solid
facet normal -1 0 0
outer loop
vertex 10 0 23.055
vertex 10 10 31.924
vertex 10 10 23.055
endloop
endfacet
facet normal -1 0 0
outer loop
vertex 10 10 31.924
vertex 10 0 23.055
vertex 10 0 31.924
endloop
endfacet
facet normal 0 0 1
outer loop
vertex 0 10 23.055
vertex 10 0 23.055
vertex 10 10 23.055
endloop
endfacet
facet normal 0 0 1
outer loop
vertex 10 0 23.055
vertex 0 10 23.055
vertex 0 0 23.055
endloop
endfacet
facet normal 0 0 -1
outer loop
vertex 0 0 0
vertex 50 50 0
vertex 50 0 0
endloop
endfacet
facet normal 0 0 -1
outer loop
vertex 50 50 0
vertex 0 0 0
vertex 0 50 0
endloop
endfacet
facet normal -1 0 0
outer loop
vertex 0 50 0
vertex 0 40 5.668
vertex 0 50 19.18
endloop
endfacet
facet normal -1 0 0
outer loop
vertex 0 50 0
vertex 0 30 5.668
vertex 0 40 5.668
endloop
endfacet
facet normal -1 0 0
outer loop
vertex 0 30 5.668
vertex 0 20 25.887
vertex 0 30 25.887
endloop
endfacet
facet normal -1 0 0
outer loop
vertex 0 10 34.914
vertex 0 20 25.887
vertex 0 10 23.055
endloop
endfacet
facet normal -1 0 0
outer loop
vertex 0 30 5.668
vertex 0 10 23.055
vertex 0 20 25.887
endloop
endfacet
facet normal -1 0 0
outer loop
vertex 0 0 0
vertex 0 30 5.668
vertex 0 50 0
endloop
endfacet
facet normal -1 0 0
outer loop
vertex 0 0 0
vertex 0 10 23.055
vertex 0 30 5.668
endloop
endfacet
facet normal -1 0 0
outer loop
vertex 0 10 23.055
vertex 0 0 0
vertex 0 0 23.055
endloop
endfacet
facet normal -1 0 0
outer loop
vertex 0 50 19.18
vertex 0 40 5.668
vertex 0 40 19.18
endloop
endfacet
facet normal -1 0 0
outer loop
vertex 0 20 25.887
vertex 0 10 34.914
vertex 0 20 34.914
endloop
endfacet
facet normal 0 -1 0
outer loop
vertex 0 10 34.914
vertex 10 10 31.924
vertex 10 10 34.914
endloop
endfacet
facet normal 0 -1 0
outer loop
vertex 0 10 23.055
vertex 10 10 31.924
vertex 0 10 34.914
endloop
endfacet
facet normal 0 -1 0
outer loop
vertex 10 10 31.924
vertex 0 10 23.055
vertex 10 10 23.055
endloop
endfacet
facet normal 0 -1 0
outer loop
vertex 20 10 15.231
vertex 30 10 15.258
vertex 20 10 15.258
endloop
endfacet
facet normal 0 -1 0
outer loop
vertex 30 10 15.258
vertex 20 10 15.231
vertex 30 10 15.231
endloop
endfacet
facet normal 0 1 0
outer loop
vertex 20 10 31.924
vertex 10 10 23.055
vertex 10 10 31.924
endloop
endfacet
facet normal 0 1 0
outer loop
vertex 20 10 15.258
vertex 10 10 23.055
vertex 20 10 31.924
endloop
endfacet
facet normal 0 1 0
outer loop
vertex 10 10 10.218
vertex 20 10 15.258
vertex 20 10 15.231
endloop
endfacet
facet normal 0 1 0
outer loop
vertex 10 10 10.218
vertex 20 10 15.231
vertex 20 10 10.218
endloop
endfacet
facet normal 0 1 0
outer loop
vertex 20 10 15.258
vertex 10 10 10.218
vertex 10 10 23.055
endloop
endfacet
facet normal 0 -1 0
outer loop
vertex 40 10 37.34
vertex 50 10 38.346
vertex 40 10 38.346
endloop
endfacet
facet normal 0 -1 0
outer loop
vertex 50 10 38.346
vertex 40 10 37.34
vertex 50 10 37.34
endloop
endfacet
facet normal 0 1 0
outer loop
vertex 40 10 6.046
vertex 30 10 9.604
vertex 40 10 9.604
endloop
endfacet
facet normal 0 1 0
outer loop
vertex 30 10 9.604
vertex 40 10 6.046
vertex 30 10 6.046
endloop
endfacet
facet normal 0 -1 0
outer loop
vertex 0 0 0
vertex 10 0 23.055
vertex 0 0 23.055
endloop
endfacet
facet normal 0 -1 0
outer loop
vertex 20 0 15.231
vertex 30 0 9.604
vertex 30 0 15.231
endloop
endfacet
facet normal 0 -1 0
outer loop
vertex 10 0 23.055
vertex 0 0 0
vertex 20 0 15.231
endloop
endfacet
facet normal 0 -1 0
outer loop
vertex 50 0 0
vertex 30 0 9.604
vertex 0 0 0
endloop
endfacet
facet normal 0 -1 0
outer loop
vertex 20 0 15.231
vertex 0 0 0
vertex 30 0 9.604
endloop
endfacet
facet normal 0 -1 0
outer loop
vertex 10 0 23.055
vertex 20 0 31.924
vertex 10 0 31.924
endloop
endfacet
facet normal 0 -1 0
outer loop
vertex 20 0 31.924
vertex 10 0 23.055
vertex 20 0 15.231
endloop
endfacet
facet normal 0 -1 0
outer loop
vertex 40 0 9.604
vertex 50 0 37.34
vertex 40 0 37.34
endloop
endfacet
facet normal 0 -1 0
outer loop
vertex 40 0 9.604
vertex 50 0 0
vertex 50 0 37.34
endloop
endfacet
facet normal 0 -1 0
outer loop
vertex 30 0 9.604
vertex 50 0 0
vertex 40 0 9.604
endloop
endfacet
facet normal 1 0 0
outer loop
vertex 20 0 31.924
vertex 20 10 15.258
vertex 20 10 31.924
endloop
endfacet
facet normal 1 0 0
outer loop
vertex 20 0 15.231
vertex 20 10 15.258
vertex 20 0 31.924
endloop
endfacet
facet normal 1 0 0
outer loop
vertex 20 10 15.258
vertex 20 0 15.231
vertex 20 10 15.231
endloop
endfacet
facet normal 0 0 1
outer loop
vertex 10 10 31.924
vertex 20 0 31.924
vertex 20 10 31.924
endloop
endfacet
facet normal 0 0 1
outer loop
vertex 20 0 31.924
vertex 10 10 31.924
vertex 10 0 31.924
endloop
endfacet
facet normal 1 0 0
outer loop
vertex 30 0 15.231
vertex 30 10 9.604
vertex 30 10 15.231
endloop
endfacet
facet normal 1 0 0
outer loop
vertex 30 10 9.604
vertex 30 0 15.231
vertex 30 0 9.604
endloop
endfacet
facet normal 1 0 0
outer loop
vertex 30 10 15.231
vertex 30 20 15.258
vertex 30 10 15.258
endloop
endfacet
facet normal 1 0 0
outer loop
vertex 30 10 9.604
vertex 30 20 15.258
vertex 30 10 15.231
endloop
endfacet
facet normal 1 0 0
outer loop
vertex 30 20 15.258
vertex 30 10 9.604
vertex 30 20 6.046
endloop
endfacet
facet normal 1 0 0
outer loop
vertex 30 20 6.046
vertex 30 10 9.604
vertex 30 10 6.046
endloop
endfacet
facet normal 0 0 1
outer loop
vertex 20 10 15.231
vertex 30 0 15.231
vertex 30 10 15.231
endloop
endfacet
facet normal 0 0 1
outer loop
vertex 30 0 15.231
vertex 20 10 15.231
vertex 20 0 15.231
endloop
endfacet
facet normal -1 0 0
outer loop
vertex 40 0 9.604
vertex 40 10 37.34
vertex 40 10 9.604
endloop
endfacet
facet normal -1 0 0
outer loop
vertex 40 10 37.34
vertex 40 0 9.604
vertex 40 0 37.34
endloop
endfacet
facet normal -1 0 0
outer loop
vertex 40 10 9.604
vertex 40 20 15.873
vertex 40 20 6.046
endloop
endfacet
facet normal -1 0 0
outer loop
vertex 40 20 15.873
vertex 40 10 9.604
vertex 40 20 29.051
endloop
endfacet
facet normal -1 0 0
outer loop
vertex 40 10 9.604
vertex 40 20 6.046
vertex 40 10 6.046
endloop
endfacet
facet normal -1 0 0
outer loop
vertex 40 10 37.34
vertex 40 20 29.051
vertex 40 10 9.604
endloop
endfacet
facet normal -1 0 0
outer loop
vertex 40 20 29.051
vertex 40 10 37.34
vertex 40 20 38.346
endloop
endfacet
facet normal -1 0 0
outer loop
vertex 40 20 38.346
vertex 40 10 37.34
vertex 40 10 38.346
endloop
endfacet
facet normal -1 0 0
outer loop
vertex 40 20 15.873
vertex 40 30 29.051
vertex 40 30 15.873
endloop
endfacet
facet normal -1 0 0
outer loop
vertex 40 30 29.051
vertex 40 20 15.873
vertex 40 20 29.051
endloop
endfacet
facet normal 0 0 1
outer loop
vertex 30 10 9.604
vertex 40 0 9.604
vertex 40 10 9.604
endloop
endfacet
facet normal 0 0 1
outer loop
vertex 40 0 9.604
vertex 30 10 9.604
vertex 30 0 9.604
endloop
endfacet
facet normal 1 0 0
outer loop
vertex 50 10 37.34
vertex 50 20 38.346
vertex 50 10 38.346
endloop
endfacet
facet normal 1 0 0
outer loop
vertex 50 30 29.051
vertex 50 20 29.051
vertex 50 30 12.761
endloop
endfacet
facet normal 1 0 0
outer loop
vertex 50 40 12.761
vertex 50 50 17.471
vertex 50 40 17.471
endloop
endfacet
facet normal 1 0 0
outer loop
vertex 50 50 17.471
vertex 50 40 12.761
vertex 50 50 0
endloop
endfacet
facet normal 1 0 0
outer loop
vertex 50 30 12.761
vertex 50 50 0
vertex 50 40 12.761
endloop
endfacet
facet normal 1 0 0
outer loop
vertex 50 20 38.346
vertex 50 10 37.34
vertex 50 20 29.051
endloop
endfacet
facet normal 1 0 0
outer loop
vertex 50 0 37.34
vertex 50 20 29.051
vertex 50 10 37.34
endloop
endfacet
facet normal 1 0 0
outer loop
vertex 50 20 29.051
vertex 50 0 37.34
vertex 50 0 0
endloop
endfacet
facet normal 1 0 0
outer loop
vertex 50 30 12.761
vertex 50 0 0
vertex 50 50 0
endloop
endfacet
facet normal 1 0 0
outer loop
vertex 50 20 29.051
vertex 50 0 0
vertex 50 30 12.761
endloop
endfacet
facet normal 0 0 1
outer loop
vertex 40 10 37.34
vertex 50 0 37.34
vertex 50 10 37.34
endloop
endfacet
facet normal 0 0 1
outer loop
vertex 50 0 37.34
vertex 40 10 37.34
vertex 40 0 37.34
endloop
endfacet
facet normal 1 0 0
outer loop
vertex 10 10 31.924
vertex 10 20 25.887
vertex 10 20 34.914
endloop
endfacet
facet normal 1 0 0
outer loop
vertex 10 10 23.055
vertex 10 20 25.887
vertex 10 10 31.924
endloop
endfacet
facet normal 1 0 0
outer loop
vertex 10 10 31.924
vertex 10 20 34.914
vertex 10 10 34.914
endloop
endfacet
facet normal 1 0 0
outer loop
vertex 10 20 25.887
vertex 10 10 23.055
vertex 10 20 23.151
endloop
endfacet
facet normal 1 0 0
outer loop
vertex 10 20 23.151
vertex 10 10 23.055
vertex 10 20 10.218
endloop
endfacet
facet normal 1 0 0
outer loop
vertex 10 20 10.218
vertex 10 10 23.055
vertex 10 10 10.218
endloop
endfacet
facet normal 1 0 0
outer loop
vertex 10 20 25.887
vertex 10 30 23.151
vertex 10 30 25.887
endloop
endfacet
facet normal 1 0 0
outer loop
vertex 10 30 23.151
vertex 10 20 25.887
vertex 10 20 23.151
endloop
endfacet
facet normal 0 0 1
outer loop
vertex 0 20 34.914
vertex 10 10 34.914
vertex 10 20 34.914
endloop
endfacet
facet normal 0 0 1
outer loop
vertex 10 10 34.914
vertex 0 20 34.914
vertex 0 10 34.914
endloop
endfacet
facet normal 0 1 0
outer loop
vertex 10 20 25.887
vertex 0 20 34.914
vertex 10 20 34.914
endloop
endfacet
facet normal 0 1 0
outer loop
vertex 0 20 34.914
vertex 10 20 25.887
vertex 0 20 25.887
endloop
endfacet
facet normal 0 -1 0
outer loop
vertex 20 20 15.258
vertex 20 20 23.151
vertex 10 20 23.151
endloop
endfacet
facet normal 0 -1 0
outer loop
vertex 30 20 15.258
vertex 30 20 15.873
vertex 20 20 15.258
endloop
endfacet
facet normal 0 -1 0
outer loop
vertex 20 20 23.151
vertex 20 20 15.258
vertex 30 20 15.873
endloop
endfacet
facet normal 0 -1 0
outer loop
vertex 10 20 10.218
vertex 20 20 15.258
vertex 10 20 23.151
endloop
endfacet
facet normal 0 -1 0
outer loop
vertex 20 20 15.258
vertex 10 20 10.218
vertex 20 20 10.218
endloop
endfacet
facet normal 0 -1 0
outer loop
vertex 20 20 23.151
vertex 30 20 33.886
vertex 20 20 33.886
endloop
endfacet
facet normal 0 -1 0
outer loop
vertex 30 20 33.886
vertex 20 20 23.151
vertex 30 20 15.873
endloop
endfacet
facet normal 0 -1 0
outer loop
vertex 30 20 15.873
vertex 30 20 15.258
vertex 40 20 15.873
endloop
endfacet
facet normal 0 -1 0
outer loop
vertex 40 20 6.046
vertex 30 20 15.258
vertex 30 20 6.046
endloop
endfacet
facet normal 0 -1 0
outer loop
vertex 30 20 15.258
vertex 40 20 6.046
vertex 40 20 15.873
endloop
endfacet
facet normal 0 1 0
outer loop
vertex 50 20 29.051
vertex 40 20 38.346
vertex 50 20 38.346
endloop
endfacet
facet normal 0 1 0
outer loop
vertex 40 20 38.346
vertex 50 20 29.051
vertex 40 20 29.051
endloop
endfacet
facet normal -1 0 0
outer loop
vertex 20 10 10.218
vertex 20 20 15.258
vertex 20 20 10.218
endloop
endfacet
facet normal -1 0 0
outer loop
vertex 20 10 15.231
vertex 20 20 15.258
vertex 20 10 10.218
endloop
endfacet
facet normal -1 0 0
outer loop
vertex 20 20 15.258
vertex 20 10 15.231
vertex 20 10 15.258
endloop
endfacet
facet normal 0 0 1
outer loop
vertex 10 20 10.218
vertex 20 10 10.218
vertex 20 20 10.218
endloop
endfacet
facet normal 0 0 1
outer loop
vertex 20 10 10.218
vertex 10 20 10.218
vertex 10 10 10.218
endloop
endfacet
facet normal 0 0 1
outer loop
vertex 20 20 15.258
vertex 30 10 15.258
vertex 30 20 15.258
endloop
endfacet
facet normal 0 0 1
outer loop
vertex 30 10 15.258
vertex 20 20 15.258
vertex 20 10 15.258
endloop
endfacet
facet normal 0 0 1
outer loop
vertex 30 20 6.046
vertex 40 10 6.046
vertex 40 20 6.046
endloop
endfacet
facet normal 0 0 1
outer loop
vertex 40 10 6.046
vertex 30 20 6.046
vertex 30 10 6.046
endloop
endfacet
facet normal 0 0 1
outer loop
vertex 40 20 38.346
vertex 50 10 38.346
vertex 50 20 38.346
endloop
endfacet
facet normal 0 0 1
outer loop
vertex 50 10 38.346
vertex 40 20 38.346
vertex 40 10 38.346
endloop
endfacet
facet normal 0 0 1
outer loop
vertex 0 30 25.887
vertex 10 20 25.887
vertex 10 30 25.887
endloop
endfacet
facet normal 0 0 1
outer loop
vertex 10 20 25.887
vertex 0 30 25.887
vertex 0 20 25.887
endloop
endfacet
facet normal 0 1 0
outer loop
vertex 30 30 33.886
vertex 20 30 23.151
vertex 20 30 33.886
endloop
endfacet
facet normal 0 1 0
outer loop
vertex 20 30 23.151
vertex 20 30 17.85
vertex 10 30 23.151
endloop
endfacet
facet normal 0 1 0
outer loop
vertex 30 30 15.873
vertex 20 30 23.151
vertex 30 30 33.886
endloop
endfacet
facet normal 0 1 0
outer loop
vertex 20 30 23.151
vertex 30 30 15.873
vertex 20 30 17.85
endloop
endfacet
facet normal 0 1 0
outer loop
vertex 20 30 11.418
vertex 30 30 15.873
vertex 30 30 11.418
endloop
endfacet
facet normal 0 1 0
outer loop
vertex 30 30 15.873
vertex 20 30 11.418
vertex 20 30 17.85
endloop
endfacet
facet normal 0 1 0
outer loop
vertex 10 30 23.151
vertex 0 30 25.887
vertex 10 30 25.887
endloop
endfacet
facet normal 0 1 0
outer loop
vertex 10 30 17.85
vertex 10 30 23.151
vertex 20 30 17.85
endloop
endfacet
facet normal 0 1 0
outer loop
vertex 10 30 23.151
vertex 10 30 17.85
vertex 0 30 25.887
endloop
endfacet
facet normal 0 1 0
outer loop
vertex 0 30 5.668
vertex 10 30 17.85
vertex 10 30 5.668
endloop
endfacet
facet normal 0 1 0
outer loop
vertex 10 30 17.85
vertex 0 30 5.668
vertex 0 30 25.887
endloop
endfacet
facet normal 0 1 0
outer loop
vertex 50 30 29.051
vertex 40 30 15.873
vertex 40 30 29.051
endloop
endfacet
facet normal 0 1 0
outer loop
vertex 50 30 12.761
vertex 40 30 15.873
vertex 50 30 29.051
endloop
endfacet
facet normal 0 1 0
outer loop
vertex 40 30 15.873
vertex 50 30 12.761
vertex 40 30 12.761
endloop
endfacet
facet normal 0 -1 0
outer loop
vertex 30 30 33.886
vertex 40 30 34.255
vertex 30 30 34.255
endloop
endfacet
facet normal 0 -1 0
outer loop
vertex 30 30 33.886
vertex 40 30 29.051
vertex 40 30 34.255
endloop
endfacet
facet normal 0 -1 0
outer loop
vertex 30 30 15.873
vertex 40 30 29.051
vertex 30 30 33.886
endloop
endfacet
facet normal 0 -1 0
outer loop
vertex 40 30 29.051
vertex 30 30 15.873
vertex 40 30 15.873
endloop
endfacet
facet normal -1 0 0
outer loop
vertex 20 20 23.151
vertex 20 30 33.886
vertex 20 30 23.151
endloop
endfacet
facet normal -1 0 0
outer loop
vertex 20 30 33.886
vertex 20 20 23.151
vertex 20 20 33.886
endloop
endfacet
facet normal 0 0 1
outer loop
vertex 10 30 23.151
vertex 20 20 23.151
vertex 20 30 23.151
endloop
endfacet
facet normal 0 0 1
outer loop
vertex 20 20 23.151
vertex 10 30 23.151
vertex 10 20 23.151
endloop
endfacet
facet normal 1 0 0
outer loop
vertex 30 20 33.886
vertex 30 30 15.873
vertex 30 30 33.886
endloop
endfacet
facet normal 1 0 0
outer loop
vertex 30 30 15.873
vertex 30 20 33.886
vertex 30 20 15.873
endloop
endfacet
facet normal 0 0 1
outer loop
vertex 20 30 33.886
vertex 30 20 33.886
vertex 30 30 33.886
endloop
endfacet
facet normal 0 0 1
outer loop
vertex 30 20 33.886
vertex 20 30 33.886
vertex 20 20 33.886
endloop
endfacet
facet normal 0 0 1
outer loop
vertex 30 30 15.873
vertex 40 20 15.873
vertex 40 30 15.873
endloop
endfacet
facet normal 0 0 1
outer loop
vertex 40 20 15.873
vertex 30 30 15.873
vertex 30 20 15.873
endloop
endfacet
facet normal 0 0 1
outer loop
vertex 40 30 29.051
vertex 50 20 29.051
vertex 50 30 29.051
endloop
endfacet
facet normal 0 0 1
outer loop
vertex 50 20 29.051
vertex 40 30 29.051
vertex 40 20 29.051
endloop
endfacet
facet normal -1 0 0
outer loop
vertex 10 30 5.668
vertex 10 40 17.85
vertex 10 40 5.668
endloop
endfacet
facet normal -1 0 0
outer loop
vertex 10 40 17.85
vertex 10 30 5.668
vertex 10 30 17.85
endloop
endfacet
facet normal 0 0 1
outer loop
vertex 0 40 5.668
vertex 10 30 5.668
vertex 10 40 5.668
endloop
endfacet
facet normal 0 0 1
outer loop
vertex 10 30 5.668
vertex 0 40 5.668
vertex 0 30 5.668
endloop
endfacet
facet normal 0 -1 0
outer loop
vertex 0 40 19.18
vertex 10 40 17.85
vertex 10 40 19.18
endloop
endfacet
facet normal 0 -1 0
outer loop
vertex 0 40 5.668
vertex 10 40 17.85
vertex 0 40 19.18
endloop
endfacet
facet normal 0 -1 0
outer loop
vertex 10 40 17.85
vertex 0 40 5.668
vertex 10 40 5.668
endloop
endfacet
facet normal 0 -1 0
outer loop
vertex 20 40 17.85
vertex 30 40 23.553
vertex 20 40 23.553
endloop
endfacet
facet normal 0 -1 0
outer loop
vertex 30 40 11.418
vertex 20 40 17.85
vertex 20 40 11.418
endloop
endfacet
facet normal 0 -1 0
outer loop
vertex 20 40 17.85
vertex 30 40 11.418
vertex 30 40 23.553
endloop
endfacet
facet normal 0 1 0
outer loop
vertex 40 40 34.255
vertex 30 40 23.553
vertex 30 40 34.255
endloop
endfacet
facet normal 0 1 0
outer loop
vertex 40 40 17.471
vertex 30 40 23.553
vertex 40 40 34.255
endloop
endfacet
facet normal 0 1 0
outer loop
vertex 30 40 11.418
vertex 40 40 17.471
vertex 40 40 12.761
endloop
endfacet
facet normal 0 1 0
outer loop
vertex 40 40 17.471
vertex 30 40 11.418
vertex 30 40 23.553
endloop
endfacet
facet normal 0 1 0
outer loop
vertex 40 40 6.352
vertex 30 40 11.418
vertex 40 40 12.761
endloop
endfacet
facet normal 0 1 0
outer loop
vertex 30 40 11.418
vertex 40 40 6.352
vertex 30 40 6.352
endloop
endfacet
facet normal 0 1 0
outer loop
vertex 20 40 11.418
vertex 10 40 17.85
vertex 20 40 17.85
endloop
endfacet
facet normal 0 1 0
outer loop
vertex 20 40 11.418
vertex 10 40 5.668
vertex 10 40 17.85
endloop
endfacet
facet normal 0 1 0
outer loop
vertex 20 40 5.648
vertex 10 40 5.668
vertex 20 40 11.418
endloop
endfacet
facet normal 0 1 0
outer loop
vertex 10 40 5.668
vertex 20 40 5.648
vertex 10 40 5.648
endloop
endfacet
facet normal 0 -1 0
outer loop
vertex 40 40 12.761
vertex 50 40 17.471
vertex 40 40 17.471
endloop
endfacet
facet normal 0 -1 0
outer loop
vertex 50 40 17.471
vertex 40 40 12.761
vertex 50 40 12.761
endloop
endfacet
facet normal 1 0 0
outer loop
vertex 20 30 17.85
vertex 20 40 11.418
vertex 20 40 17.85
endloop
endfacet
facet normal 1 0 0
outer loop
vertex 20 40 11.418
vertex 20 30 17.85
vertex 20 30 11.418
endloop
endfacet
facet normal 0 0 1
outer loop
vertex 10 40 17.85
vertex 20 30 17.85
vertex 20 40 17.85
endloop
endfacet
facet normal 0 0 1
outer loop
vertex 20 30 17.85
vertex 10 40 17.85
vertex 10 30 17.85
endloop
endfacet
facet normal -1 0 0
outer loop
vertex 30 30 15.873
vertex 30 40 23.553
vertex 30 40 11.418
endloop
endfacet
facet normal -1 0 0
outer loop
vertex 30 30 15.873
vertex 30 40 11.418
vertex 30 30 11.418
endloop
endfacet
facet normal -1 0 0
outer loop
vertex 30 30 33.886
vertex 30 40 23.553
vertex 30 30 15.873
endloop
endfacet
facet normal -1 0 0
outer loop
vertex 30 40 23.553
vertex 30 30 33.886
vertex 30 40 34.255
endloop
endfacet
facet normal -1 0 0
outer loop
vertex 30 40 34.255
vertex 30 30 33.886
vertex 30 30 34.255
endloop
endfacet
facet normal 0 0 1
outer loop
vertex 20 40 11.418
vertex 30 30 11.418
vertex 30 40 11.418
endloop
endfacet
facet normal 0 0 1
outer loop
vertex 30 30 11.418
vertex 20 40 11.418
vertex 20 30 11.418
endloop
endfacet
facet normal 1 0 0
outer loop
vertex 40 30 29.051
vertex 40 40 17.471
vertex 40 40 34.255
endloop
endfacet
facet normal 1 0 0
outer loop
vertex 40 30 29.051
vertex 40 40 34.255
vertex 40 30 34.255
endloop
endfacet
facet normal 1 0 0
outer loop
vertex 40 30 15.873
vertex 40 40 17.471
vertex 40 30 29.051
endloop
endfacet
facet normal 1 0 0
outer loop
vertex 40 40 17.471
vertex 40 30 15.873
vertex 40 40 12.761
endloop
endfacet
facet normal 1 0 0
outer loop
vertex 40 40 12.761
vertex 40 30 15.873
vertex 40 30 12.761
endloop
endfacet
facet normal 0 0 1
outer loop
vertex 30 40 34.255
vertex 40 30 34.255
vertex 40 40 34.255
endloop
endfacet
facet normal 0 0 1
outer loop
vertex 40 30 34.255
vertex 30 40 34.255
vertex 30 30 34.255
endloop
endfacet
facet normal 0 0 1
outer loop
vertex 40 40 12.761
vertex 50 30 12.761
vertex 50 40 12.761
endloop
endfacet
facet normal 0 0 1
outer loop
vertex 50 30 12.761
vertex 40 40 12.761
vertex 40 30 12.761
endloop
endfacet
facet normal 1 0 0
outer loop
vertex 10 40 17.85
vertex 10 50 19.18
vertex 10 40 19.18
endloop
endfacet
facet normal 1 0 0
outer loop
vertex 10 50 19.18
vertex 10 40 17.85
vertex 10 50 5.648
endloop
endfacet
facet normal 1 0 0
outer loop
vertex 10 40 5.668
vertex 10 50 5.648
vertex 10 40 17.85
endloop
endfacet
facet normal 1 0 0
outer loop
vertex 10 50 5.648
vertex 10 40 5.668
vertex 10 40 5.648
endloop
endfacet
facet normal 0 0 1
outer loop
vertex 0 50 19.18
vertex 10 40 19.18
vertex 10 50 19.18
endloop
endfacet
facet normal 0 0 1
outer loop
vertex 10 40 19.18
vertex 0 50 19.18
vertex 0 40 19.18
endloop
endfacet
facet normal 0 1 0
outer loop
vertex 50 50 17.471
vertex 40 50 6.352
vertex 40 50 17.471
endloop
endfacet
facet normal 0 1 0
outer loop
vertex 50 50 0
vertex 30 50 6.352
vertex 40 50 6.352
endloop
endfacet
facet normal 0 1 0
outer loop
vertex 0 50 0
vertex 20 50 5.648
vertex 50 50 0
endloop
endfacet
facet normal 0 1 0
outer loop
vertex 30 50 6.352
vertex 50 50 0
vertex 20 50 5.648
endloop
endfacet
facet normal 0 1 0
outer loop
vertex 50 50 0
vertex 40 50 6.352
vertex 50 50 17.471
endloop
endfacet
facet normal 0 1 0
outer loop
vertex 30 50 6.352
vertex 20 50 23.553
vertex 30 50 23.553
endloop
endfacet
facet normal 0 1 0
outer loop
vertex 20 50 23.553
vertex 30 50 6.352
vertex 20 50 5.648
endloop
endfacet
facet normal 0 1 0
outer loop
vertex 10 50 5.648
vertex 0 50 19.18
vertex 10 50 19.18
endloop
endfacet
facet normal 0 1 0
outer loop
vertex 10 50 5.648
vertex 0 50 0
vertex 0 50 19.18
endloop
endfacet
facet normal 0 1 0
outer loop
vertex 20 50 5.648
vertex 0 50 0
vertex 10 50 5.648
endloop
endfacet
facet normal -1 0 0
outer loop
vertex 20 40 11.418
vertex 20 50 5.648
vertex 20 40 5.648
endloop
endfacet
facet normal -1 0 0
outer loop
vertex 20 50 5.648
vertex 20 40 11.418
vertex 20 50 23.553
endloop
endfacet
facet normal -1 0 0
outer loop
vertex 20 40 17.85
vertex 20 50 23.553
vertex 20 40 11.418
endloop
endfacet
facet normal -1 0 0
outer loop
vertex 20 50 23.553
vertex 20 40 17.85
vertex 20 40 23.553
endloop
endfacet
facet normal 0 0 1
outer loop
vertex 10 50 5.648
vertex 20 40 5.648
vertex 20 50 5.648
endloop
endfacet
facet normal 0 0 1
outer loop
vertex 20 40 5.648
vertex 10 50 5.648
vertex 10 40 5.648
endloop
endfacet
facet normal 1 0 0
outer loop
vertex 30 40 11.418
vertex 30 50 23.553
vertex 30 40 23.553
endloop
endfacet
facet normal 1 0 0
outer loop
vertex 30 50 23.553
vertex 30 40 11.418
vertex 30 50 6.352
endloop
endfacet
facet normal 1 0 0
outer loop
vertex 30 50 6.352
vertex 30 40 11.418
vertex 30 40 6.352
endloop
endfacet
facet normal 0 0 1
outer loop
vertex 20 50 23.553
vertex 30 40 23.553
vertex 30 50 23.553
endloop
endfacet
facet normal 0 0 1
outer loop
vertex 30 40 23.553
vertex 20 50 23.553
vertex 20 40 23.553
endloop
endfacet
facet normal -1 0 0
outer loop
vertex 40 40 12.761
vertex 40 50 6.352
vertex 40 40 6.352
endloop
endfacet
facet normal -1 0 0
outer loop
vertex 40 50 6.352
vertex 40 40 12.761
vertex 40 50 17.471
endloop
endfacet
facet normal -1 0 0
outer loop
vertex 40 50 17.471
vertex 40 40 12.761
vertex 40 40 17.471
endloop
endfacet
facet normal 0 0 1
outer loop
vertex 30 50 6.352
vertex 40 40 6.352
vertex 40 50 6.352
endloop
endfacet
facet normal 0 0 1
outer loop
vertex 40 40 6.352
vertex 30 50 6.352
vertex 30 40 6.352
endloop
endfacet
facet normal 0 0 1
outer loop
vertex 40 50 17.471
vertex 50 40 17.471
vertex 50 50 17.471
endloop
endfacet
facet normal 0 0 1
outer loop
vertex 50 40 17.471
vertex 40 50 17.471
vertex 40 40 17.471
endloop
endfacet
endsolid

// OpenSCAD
///////////////////////////////////

// Customizable Grid of Towers


///////////////////////////////////

// Width of grid
w=5;
// Length of grid
l=5;

// X width of tower
x=10;
// Y length of tower
y=10;
// Height of tower (see below)
z=1;

// Minimum tower height as a multiple of cell height, so 40 will be minimum 5 times the height of cell.
mn=5;

// Maximum tower height as a multiple of cell height, so 40 will be maximum 40 times the height of cell.
mx=40;




//////////////////////////////////




/////////////////////////////////////////////////////

module row(c){
    for(a =[0:w-1]){
        clr1=rands(-1,2,w);
        clr2=rands(-1,2,w);
        clr3=rands(-1,2,w);
        translate([a*x,0,0]) scale([x,y,z*c[a]]) color([clr1[a],clr2[a],clr3[a]]) cube(1);
    
    }
}
module grid(){
    for(b =[0:1:l-1]){
            h=rands(mn,mx,w*l);
            translate([0,b*y,0]) row(h);
        
    }   
}
//minkowski(){
    grid();
   // sphere(1);
//}











/////////////////////////////////////////////////////
